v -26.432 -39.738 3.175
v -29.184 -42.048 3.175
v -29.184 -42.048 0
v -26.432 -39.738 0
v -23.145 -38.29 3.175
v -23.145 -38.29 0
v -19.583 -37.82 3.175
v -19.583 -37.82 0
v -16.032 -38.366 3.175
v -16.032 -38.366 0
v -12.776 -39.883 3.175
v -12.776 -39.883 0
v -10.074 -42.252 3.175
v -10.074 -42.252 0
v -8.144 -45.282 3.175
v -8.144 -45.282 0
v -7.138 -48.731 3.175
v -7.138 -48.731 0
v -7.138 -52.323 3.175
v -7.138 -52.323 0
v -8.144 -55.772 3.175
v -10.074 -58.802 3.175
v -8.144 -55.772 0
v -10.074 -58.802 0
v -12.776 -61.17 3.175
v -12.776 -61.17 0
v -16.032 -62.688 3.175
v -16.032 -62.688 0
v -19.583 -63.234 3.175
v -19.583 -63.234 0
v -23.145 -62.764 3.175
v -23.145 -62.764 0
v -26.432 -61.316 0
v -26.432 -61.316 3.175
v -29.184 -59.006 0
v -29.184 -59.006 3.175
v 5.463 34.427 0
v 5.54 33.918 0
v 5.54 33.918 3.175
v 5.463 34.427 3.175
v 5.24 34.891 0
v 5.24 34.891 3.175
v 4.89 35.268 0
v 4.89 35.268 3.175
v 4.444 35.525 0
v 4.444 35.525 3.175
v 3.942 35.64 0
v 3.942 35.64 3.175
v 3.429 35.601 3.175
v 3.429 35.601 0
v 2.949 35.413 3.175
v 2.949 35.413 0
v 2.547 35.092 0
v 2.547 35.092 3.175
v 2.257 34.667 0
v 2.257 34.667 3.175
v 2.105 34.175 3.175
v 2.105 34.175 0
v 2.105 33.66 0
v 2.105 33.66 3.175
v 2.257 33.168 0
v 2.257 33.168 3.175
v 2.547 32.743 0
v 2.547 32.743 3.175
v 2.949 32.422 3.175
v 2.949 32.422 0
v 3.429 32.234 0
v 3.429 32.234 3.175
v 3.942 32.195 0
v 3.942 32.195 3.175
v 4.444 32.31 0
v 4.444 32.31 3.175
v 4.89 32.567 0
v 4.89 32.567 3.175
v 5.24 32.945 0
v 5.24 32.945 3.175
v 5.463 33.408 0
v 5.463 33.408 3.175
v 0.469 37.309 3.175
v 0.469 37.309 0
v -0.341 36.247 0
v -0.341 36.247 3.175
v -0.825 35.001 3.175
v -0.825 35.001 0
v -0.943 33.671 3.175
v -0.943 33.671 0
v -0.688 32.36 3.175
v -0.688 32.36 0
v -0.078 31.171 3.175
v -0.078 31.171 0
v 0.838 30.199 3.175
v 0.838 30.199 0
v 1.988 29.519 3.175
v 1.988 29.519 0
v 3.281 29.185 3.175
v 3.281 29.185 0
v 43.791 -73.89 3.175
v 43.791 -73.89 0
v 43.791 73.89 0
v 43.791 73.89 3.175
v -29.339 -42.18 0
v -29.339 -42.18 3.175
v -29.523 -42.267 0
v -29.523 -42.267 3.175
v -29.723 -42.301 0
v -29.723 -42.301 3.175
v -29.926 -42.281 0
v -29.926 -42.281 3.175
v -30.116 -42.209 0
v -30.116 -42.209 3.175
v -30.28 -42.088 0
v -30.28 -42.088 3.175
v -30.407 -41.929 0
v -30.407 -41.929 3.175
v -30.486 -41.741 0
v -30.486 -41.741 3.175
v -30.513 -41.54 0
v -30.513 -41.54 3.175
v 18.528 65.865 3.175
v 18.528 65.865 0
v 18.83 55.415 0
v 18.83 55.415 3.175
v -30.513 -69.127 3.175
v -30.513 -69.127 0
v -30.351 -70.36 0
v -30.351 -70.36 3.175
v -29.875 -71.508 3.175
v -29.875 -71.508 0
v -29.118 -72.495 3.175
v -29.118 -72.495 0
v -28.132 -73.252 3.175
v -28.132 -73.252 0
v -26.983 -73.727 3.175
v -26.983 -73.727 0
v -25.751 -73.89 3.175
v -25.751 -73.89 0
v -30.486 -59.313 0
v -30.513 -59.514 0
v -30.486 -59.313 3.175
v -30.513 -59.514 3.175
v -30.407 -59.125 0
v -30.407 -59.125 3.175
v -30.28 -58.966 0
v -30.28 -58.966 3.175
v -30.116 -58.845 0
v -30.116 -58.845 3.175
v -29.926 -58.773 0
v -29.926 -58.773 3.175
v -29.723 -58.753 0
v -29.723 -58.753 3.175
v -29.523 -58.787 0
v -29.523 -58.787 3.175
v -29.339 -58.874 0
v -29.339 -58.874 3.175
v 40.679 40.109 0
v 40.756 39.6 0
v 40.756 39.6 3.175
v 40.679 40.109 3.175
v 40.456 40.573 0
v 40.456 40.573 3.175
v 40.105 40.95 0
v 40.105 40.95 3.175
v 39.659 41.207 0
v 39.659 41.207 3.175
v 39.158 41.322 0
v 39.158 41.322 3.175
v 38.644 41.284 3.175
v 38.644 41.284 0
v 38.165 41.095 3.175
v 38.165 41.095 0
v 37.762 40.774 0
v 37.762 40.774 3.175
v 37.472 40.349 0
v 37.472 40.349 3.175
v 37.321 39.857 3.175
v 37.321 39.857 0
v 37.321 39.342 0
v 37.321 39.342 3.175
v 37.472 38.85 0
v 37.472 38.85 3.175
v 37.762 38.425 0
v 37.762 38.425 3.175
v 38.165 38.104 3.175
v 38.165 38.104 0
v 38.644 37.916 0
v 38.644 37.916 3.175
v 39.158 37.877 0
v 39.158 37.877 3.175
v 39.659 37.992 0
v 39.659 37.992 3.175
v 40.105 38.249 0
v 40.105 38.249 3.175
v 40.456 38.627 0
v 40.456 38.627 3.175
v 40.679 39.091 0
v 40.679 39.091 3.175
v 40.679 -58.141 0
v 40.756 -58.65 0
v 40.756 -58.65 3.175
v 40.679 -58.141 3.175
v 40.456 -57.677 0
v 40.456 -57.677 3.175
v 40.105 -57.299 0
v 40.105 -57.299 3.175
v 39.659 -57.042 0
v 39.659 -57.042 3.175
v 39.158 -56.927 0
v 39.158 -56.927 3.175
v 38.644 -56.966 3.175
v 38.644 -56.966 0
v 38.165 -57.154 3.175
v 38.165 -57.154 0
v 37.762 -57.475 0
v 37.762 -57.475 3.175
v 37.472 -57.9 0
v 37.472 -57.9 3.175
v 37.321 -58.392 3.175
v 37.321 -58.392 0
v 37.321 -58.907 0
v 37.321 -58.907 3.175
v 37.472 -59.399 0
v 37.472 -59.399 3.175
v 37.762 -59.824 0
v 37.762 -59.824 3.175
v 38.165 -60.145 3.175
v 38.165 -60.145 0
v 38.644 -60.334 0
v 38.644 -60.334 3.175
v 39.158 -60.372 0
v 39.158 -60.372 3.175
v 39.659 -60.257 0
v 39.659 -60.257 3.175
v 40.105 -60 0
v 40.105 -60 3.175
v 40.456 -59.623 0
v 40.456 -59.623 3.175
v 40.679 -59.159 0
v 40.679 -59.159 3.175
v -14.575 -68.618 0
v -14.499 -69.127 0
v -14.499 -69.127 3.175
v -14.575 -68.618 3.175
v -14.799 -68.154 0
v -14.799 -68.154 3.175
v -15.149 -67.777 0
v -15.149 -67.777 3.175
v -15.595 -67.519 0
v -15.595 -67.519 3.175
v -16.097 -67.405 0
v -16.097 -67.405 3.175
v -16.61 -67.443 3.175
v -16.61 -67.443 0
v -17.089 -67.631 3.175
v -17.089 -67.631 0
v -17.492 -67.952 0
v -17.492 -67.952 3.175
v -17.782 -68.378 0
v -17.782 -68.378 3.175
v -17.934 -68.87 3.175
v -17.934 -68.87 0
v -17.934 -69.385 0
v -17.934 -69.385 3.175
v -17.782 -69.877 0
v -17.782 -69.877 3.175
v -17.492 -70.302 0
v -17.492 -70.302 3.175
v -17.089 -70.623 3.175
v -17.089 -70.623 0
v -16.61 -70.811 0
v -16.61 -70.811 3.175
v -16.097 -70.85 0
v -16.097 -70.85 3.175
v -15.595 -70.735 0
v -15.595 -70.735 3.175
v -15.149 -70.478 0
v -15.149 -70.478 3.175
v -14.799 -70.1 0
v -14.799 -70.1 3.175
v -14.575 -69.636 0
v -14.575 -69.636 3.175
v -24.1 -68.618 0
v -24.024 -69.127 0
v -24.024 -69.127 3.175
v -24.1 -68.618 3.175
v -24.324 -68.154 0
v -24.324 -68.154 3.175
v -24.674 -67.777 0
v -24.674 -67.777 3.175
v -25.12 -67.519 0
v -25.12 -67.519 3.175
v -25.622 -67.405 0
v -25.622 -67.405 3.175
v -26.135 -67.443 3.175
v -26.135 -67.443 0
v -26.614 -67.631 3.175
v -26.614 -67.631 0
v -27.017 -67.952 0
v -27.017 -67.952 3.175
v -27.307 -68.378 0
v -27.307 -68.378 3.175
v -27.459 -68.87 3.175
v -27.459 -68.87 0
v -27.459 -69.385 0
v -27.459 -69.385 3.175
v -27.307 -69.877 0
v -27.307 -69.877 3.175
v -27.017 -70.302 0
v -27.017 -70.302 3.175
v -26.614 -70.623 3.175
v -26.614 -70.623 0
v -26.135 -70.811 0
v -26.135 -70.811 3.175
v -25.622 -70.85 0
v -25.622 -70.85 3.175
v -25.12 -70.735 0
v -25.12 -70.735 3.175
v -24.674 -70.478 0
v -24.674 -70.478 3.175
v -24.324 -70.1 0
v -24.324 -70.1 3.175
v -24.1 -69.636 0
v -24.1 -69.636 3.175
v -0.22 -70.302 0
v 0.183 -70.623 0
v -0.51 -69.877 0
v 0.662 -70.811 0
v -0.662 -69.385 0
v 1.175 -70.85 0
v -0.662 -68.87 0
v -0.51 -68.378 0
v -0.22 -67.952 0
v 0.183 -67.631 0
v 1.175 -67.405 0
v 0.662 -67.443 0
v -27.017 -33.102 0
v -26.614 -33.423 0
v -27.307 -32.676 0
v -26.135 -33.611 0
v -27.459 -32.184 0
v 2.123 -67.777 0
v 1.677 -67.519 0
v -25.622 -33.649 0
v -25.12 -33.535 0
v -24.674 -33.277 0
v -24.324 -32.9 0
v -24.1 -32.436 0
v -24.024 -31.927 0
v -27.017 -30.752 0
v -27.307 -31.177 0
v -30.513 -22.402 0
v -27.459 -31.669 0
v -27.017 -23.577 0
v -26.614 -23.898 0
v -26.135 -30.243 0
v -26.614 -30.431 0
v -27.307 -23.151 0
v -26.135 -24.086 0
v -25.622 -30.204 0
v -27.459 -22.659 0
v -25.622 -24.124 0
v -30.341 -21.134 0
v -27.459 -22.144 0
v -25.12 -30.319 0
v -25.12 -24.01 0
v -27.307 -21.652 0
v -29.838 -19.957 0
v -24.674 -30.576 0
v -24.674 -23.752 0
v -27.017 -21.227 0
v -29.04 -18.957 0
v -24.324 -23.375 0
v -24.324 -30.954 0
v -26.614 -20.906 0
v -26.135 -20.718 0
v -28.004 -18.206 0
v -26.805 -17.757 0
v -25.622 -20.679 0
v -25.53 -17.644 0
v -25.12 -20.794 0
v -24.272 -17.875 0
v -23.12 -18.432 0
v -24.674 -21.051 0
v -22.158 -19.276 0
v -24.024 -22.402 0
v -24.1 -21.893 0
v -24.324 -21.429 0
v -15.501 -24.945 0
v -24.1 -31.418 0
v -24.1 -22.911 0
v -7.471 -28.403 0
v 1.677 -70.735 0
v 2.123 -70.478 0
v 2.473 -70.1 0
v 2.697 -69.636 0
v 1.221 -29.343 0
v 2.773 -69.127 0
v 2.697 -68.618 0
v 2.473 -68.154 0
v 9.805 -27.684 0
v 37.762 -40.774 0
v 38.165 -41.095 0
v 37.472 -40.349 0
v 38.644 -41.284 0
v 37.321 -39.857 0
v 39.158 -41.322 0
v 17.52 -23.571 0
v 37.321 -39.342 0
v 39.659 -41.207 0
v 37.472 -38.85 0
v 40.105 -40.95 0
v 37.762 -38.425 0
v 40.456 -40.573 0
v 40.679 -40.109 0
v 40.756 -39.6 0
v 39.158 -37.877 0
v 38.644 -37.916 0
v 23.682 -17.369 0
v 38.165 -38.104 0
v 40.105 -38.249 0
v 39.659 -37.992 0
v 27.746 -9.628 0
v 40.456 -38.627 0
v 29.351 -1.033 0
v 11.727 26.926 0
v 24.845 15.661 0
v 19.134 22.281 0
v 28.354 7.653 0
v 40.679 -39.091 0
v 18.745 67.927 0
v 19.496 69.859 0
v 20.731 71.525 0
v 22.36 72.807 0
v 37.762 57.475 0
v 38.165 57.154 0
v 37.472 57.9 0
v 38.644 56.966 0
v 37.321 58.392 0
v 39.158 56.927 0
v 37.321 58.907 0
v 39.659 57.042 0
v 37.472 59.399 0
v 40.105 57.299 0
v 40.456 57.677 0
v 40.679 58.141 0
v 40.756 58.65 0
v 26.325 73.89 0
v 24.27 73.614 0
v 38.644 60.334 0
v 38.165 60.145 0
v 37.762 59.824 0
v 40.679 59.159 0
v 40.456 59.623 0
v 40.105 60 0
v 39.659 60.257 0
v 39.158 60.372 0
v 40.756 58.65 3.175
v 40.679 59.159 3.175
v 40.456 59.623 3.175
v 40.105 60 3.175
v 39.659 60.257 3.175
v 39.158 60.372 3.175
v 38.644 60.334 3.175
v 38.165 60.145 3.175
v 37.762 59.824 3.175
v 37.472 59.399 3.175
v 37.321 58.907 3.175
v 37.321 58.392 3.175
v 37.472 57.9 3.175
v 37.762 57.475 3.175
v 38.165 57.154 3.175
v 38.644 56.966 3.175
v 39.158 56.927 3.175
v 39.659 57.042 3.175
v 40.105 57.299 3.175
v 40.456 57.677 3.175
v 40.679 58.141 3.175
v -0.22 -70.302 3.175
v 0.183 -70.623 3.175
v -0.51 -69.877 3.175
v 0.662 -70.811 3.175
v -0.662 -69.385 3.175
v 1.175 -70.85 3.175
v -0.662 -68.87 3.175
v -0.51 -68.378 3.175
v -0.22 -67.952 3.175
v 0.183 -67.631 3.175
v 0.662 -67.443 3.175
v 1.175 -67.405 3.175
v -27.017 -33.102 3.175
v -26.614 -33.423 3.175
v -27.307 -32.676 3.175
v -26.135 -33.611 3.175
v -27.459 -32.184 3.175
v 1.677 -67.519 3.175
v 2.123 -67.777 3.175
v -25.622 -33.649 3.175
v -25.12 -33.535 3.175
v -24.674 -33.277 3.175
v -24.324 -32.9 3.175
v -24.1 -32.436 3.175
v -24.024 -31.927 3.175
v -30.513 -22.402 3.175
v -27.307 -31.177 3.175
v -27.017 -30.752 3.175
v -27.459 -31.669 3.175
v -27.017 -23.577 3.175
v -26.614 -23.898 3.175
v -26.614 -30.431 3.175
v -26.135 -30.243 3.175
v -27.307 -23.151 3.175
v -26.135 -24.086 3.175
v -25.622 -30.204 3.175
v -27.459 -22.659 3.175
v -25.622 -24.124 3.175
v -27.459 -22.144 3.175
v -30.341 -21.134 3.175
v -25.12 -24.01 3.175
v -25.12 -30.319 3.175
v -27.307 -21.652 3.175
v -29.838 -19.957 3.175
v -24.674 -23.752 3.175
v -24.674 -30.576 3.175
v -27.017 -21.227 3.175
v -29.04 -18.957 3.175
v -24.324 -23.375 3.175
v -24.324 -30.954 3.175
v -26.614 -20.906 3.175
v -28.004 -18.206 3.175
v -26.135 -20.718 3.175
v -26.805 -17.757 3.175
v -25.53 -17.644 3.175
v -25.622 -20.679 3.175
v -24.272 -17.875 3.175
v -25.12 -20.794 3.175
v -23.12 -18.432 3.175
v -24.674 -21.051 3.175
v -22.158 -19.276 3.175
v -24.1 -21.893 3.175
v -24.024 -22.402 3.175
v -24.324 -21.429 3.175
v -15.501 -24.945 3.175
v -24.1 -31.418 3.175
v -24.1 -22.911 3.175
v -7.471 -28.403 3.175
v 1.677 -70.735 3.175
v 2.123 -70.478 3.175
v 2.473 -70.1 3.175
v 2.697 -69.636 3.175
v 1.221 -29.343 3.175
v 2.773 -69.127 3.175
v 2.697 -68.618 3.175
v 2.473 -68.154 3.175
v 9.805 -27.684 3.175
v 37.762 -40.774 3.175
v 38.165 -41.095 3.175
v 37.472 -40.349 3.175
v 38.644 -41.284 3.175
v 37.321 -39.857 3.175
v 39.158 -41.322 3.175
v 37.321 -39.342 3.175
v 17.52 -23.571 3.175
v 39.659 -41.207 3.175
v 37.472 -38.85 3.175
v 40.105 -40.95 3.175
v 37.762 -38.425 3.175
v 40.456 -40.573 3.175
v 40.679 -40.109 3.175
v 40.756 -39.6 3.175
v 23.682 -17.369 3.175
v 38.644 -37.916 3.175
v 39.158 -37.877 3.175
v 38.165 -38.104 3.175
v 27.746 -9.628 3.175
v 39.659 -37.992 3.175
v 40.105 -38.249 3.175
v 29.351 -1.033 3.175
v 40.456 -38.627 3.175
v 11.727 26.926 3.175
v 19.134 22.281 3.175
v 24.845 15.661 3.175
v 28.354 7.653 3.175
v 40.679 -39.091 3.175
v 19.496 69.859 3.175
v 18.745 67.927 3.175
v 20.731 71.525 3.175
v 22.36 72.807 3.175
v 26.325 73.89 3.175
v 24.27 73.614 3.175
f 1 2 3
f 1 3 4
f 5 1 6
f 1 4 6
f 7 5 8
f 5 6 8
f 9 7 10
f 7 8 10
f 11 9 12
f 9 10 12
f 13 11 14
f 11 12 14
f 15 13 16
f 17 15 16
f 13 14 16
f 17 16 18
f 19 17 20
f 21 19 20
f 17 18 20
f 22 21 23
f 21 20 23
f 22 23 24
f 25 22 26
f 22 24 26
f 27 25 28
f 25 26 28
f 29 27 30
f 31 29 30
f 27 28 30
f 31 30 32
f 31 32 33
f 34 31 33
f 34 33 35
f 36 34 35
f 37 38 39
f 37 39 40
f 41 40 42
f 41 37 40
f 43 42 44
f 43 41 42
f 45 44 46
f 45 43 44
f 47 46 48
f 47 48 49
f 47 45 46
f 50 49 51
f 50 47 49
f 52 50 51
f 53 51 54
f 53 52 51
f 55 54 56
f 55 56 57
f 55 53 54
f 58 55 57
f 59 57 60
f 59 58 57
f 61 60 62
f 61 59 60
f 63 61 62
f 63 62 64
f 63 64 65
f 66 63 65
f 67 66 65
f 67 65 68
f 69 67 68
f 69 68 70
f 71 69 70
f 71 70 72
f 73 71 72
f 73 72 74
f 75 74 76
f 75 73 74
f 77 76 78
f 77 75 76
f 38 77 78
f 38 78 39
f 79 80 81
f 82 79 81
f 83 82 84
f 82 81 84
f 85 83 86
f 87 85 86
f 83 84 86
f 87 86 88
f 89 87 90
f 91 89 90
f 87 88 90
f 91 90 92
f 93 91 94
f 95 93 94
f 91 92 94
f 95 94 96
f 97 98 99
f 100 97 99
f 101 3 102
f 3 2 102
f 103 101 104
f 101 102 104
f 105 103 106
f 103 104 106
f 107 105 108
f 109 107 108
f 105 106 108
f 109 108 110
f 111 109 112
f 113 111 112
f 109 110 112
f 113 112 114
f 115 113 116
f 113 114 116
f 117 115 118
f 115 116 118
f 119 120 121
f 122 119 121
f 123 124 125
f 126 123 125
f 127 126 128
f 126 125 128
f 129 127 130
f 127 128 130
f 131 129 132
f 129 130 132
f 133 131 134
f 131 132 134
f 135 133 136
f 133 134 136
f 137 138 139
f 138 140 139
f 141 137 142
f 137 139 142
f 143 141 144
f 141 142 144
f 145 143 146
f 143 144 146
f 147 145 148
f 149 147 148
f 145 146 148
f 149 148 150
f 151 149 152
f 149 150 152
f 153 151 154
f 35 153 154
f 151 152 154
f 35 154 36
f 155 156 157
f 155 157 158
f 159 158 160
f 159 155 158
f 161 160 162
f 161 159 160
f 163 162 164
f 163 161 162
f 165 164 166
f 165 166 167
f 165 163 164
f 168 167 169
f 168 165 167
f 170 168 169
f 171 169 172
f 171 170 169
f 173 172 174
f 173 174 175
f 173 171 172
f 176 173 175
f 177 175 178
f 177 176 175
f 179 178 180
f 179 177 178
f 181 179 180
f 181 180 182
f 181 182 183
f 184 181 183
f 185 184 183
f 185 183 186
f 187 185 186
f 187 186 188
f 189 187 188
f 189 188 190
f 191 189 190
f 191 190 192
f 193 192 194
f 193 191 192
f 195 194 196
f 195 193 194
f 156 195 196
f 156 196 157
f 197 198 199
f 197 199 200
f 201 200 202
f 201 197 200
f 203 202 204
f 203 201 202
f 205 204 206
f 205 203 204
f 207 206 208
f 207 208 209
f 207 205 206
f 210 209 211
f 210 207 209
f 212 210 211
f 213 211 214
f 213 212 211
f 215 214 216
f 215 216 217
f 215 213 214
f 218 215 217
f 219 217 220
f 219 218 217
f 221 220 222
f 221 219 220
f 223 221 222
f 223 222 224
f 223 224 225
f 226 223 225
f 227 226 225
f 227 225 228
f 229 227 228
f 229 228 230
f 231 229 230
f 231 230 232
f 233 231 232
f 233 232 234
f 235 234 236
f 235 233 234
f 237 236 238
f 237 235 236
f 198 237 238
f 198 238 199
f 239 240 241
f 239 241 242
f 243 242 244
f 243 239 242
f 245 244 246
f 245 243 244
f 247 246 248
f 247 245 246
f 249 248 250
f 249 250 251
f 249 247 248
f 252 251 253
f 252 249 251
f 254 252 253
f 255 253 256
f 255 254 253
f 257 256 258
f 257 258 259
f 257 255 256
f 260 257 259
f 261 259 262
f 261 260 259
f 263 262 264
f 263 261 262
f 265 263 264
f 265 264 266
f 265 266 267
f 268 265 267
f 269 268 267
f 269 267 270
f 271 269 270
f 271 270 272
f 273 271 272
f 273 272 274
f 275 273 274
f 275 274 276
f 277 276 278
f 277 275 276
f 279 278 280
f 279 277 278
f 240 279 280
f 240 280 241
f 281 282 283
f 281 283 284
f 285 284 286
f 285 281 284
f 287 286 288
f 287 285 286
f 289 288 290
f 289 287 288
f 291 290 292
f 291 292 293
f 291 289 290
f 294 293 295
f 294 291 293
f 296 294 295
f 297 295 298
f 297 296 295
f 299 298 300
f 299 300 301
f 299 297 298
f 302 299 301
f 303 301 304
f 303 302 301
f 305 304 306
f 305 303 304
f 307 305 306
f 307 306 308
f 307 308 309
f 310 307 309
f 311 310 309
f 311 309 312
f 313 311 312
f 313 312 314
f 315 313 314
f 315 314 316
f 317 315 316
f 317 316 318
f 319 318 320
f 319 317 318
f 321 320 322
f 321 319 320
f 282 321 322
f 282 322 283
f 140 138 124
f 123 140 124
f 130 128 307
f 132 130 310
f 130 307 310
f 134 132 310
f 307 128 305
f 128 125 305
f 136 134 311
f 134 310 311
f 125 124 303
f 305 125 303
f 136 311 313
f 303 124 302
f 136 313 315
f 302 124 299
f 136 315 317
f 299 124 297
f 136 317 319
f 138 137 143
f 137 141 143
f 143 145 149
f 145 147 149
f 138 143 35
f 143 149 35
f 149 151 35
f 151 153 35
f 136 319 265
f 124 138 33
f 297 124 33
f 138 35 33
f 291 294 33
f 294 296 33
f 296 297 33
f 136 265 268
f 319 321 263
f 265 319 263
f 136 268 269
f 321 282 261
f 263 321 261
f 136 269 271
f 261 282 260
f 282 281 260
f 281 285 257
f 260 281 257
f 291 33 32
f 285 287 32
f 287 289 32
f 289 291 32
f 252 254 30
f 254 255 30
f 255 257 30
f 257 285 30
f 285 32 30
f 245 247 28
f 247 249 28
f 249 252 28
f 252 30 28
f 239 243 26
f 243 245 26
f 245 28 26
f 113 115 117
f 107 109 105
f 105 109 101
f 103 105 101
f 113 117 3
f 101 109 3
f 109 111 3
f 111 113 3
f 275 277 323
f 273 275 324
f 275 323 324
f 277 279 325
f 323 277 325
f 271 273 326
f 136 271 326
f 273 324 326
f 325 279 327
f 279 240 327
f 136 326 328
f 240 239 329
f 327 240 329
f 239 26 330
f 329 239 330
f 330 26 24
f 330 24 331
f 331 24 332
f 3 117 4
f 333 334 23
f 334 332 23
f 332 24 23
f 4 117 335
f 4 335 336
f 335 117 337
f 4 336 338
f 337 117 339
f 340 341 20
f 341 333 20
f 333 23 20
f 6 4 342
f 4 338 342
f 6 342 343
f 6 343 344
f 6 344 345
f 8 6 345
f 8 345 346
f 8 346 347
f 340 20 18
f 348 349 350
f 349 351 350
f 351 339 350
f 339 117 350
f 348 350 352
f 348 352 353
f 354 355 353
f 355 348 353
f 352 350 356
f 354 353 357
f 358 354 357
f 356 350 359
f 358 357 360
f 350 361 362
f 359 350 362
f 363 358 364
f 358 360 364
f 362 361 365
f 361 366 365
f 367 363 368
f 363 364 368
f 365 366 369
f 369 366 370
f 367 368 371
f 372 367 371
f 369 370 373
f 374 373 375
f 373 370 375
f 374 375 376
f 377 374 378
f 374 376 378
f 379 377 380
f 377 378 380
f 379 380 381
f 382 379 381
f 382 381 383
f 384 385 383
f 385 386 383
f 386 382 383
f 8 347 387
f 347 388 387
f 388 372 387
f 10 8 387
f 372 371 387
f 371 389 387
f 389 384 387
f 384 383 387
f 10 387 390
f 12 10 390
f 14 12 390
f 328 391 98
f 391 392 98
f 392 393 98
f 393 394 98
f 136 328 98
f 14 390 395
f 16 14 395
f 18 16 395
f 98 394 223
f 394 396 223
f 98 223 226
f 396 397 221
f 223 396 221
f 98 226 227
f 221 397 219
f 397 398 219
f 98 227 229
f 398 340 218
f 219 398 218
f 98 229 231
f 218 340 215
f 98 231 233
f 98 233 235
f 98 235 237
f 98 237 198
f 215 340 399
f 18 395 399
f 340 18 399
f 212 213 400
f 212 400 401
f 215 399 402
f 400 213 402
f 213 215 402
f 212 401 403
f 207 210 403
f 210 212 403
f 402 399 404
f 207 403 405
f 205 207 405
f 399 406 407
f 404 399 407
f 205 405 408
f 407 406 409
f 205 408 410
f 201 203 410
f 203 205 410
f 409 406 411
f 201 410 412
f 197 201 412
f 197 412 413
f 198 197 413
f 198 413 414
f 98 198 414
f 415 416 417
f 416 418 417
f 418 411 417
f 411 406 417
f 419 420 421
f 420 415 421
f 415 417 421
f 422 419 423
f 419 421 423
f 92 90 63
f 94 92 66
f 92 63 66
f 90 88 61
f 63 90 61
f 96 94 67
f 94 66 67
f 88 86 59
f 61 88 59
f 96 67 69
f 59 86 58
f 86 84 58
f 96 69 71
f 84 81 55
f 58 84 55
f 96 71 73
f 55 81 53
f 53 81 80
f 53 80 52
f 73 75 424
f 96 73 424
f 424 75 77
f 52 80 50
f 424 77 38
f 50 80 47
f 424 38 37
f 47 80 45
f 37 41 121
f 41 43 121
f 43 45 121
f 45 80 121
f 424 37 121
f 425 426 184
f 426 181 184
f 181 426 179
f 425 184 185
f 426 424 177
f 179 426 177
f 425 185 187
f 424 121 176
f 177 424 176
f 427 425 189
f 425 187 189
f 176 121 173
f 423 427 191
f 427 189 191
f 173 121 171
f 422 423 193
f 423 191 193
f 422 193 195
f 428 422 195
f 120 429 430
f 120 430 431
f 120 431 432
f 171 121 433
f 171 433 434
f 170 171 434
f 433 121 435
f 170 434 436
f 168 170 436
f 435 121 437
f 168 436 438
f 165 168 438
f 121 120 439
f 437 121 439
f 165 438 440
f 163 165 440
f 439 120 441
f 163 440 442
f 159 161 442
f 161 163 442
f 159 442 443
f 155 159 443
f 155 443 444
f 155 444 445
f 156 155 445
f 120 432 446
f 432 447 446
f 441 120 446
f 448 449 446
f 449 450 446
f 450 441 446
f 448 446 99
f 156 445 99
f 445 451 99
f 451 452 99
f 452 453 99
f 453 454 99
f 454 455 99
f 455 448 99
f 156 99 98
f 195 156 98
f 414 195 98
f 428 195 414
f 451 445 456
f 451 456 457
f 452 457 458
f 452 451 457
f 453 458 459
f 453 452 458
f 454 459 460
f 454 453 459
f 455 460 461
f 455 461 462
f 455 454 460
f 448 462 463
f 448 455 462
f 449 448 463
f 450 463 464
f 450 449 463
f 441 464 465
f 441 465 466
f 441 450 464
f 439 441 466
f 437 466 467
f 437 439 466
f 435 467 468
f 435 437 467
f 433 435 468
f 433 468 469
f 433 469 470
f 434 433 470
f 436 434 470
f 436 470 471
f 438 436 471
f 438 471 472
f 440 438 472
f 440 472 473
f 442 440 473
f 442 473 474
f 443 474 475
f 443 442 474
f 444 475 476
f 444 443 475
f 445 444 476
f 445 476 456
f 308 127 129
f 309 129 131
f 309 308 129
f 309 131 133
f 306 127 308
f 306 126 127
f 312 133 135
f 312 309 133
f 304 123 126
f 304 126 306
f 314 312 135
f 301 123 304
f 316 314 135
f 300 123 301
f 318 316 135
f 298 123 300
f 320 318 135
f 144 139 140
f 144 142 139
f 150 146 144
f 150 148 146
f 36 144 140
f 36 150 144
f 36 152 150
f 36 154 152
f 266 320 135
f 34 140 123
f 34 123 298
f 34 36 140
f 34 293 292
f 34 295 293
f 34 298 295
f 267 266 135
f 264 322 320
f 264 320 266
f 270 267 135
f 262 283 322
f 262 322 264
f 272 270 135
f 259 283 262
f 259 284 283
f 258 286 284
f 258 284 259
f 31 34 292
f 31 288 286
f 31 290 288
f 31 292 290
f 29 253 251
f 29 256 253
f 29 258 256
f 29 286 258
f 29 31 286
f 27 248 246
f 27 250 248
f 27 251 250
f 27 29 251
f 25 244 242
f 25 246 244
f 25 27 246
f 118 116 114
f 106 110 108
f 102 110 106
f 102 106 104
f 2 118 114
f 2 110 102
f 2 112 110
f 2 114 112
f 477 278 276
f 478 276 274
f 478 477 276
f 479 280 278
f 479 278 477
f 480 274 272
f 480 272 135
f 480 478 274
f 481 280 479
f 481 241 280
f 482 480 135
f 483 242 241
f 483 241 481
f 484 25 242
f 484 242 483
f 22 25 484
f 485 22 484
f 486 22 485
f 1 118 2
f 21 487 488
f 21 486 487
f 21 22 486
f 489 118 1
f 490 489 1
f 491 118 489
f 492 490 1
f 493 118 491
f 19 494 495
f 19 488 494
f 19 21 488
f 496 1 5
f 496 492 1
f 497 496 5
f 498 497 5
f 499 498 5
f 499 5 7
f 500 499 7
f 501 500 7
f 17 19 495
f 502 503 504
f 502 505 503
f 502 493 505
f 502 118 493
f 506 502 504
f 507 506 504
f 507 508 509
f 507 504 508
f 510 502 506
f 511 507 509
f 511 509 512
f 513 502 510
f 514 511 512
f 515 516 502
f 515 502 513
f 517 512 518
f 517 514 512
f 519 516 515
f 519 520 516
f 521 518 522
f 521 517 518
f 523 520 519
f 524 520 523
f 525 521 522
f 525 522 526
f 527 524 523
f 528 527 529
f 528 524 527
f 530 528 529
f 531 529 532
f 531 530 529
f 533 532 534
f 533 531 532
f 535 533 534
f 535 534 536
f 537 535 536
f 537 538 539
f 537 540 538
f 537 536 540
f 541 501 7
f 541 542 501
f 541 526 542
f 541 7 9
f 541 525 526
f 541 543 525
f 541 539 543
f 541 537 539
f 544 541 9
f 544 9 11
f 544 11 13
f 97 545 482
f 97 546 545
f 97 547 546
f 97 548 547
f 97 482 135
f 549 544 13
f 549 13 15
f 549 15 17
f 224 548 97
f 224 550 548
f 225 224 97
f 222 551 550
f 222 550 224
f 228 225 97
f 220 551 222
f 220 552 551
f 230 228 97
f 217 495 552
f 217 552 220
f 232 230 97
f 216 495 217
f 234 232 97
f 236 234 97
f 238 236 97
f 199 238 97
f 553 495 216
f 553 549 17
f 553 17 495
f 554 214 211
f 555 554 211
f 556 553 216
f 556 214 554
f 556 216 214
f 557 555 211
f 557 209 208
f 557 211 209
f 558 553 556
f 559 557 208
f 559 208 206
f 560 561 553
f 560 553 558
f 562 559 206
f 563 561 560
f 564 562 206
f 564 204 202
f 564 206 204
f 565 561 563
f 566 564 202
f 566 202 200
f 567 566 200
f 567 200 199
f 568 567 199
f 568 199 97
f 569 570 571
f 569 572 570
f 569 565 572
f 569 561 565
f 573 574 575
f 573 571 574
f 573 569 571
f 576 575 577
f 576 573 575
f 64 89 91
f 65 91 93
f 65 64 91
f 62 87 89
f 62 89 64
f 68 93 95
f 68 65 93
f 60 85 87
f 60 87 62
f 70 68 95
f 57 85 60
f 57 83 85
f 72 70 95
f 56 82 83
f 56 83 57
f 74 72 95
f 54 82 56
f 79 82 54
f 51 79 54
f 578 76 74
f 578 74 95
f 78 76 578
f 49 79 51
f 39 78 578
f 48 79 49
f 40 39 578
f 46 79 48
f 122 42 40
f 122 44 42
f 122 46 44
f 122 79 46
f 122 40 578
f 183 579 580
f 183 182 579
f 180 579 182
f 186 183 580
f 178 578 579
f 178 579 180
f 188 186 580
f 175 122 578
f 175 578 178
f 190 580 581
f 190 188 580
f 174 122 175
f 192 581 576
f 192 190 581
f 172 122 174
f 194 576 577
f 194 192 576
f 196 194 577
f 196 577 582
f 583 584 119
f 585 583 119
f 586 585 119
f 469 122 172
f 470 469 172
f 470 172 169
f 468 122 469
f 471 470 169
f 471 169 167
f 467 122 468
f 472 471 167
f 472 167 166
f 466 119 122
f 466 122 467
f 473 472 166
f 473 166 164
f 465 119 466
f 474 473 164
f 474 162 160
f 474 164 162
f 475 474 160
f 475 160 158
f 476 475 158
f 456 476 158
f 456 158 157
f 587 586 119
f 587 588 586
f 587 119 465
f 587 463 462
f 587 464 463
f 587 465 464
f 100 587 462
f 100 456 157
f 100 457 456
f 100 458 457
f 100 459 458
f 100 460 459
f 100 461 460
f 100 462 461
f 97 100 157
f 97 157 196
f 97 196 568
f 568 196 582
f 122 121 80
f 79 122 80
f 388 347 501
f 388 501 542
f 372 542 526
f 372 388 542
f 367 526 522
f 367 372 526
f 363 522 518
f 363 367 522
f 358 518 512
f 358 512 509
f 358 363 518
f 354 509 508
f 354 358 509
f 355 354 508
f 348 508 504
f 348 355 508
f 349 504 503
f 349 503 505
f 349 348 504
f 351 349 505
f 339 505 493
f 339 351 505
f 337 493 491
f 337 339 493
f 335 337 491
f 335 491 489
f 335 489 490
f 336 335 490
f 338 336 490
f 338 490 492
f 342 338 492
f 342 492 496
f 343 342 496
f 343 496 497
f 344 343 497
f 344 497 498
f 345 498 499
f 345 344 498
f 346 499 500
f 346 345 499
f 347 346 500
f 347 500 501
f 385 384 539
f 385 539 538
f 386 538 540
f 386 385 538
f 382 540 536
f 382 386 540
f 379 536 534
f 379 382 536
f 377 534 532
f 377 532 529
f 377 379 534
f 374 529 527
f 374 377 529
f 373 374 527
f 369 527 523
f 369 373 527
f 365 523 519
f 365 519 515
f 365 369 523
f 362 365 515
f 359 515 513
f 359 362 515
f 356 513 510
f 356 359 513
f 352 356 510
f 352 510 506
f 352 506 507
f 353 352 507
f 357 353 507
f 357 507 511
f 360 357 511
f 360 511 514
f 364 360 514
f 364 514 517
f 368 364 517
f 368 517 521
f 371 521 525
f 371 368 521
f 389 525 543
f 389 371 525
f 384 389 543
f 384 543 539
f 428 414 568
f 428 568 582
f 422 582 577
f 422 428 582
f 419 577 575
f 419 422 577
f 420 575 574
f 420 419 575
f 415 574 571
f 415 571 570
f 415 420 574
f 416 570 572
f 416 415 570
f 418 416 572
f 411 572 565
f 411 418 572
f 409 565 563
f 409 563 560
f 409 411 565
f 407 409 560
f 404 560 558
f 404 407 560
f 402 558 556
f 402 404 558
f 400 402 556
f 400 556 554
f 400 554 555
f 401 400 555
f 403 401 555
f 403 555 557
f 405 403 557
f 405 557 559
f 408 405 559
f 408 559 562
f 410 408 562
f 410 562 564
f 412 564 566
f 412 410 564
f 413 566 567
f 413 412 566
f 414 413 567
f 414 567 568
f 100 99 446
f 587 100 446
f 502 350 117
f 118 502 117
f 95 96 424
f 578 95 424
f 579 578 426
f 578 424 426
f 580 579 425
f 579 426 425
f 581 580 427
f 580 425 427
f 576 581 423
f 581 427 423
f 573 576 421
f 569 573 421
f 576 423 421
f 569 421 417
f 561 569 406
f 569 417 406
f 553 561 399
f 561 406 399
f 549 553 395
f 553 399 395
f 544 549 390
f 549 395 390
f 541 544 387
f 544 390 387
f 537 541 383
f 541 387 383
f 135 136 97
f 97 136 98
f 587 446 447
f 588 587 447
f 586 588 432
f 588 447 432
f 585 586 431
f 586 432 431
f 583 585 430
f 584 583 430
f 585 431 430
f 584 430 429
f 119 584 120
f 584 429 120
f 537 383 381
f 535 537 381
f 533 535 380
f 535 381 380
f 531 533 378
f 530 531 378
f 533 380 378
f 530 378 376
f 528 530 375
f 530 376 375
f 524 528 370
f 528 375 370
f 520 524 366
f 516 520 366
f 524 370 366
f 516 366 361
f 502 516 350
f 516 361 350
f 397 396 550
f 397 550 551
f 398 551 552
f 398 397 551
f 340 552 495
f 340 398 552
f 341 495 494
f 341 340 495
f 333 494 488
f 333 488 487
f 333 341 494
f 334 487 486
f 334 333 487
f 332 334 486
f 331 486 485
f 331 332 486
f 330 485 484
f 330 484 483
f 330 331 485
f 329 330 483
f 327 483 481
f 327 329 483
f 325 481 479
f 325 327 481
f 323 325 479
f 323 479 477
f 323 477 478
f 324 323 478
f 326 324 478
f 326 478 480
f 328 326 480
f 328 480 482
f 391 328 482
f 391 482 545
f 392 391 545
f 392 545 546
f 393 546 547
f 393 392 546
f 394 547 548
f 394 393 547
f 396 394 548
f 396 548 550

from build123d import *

# Parameters (mm, degrees)
F0_R     = 1.7272
F1_DEPTH = 3.175
F2_R     = 0.762


with BuildPart() as f1:
    # F0 (on Top) → F1 (new body)
    with BuildSketch(Plane.XY):
        with BuildLine():
            Line((-25.750805, -73.88963), (43.790972, -73.88963))
            Line((43.790972, -73.88963), (43.790972, 73.88963))
            Line((43.790972, 73.88963), (26.324776, 73.88963))
            ThreePointArc((26.324776, 73.88963), (20.730742, 71.525126), (18.528473, 65.865257))
            Line((18.528473, 65.865257), (18.82983, 55.415228))
            Line((18.82983, 55.415228), (0.468945, 37.308589))
            ThreePointArc((0.468945, 37.308589), (-0.687524, 32.359758), (3.280937, 29.184909))
            ThreePointArc((3.280937, 29.184909), (26.003765, -13.65019), (-22.15767, -19.275922))
            ThreePointArc((-22.15767, -19.275922), (-27.419502, -17.941157), (-30.513305, -22.401747))
            Line((-30.513305, -22.401747), (-30.513305, -43.822152))
            ThreePointArc((-30.513305, -43.822152), (-7.010584, -50.526938), (-30.513305, -57.231725))
            Line((-30.513305, -57.231725), (-30.513305, -69.12713))
            ThreePointArc((-30.513305, -69.12713), (-29.118401, -72.494726), (-25.750805, -73.88963))
        make_face()
        with Locations((-25.750805, -69.12713)):
            Circle(F0_R, mode=Mode.SUBTRACT)
        with Locations((-16.225805, -69.12713)):
            Circle(F0_R, mode=Mode.SUBTRACT)
        with Locations((1.046195, -69.12713)):
            Circle(F0_R, mode=Mode.SUBTRACT)
        with Locations((-25.750805, -31.926747)):
            Circle(F0_R, mode=Mode.SUBTRACT)
        with Locations((-25.750805, -22.401747)):
            Circle(F0_R, mode=Mode.SUBTRACT)
        with Locations((39.028472, -58.64963)):
            Circle(F0_R, mode=Mode.SUBTRACT)
        with Locations((39.028472, -39.59963)):
            Circle(F0_R, mode=Mode.SUBTRACT)
        with Locations((3.812981, 33.917597)):
            Circle(F0_R, mode=Mode.SUBTRACT)
        with Locations((39.028472, 39.59963)):
            Circle(F0_R, mode=Mode.SUBTRACT)
        with Locations((39.028472, 58.64963)):
            Circle(F0_R, mode=Mode.SUBTRACT)
    extrude(amount=F1_DEPTH)

    # F2
    f2_edges = [f1.edges().sort_by_distance(p)[0] for p in [
        (-30.513305, -43.822152, 1.5875),
        (-30.513305, -57.231725, 1.5875),
    ]]
    fillet(f2_edges, radius=F2_R)


solid = f1.part
